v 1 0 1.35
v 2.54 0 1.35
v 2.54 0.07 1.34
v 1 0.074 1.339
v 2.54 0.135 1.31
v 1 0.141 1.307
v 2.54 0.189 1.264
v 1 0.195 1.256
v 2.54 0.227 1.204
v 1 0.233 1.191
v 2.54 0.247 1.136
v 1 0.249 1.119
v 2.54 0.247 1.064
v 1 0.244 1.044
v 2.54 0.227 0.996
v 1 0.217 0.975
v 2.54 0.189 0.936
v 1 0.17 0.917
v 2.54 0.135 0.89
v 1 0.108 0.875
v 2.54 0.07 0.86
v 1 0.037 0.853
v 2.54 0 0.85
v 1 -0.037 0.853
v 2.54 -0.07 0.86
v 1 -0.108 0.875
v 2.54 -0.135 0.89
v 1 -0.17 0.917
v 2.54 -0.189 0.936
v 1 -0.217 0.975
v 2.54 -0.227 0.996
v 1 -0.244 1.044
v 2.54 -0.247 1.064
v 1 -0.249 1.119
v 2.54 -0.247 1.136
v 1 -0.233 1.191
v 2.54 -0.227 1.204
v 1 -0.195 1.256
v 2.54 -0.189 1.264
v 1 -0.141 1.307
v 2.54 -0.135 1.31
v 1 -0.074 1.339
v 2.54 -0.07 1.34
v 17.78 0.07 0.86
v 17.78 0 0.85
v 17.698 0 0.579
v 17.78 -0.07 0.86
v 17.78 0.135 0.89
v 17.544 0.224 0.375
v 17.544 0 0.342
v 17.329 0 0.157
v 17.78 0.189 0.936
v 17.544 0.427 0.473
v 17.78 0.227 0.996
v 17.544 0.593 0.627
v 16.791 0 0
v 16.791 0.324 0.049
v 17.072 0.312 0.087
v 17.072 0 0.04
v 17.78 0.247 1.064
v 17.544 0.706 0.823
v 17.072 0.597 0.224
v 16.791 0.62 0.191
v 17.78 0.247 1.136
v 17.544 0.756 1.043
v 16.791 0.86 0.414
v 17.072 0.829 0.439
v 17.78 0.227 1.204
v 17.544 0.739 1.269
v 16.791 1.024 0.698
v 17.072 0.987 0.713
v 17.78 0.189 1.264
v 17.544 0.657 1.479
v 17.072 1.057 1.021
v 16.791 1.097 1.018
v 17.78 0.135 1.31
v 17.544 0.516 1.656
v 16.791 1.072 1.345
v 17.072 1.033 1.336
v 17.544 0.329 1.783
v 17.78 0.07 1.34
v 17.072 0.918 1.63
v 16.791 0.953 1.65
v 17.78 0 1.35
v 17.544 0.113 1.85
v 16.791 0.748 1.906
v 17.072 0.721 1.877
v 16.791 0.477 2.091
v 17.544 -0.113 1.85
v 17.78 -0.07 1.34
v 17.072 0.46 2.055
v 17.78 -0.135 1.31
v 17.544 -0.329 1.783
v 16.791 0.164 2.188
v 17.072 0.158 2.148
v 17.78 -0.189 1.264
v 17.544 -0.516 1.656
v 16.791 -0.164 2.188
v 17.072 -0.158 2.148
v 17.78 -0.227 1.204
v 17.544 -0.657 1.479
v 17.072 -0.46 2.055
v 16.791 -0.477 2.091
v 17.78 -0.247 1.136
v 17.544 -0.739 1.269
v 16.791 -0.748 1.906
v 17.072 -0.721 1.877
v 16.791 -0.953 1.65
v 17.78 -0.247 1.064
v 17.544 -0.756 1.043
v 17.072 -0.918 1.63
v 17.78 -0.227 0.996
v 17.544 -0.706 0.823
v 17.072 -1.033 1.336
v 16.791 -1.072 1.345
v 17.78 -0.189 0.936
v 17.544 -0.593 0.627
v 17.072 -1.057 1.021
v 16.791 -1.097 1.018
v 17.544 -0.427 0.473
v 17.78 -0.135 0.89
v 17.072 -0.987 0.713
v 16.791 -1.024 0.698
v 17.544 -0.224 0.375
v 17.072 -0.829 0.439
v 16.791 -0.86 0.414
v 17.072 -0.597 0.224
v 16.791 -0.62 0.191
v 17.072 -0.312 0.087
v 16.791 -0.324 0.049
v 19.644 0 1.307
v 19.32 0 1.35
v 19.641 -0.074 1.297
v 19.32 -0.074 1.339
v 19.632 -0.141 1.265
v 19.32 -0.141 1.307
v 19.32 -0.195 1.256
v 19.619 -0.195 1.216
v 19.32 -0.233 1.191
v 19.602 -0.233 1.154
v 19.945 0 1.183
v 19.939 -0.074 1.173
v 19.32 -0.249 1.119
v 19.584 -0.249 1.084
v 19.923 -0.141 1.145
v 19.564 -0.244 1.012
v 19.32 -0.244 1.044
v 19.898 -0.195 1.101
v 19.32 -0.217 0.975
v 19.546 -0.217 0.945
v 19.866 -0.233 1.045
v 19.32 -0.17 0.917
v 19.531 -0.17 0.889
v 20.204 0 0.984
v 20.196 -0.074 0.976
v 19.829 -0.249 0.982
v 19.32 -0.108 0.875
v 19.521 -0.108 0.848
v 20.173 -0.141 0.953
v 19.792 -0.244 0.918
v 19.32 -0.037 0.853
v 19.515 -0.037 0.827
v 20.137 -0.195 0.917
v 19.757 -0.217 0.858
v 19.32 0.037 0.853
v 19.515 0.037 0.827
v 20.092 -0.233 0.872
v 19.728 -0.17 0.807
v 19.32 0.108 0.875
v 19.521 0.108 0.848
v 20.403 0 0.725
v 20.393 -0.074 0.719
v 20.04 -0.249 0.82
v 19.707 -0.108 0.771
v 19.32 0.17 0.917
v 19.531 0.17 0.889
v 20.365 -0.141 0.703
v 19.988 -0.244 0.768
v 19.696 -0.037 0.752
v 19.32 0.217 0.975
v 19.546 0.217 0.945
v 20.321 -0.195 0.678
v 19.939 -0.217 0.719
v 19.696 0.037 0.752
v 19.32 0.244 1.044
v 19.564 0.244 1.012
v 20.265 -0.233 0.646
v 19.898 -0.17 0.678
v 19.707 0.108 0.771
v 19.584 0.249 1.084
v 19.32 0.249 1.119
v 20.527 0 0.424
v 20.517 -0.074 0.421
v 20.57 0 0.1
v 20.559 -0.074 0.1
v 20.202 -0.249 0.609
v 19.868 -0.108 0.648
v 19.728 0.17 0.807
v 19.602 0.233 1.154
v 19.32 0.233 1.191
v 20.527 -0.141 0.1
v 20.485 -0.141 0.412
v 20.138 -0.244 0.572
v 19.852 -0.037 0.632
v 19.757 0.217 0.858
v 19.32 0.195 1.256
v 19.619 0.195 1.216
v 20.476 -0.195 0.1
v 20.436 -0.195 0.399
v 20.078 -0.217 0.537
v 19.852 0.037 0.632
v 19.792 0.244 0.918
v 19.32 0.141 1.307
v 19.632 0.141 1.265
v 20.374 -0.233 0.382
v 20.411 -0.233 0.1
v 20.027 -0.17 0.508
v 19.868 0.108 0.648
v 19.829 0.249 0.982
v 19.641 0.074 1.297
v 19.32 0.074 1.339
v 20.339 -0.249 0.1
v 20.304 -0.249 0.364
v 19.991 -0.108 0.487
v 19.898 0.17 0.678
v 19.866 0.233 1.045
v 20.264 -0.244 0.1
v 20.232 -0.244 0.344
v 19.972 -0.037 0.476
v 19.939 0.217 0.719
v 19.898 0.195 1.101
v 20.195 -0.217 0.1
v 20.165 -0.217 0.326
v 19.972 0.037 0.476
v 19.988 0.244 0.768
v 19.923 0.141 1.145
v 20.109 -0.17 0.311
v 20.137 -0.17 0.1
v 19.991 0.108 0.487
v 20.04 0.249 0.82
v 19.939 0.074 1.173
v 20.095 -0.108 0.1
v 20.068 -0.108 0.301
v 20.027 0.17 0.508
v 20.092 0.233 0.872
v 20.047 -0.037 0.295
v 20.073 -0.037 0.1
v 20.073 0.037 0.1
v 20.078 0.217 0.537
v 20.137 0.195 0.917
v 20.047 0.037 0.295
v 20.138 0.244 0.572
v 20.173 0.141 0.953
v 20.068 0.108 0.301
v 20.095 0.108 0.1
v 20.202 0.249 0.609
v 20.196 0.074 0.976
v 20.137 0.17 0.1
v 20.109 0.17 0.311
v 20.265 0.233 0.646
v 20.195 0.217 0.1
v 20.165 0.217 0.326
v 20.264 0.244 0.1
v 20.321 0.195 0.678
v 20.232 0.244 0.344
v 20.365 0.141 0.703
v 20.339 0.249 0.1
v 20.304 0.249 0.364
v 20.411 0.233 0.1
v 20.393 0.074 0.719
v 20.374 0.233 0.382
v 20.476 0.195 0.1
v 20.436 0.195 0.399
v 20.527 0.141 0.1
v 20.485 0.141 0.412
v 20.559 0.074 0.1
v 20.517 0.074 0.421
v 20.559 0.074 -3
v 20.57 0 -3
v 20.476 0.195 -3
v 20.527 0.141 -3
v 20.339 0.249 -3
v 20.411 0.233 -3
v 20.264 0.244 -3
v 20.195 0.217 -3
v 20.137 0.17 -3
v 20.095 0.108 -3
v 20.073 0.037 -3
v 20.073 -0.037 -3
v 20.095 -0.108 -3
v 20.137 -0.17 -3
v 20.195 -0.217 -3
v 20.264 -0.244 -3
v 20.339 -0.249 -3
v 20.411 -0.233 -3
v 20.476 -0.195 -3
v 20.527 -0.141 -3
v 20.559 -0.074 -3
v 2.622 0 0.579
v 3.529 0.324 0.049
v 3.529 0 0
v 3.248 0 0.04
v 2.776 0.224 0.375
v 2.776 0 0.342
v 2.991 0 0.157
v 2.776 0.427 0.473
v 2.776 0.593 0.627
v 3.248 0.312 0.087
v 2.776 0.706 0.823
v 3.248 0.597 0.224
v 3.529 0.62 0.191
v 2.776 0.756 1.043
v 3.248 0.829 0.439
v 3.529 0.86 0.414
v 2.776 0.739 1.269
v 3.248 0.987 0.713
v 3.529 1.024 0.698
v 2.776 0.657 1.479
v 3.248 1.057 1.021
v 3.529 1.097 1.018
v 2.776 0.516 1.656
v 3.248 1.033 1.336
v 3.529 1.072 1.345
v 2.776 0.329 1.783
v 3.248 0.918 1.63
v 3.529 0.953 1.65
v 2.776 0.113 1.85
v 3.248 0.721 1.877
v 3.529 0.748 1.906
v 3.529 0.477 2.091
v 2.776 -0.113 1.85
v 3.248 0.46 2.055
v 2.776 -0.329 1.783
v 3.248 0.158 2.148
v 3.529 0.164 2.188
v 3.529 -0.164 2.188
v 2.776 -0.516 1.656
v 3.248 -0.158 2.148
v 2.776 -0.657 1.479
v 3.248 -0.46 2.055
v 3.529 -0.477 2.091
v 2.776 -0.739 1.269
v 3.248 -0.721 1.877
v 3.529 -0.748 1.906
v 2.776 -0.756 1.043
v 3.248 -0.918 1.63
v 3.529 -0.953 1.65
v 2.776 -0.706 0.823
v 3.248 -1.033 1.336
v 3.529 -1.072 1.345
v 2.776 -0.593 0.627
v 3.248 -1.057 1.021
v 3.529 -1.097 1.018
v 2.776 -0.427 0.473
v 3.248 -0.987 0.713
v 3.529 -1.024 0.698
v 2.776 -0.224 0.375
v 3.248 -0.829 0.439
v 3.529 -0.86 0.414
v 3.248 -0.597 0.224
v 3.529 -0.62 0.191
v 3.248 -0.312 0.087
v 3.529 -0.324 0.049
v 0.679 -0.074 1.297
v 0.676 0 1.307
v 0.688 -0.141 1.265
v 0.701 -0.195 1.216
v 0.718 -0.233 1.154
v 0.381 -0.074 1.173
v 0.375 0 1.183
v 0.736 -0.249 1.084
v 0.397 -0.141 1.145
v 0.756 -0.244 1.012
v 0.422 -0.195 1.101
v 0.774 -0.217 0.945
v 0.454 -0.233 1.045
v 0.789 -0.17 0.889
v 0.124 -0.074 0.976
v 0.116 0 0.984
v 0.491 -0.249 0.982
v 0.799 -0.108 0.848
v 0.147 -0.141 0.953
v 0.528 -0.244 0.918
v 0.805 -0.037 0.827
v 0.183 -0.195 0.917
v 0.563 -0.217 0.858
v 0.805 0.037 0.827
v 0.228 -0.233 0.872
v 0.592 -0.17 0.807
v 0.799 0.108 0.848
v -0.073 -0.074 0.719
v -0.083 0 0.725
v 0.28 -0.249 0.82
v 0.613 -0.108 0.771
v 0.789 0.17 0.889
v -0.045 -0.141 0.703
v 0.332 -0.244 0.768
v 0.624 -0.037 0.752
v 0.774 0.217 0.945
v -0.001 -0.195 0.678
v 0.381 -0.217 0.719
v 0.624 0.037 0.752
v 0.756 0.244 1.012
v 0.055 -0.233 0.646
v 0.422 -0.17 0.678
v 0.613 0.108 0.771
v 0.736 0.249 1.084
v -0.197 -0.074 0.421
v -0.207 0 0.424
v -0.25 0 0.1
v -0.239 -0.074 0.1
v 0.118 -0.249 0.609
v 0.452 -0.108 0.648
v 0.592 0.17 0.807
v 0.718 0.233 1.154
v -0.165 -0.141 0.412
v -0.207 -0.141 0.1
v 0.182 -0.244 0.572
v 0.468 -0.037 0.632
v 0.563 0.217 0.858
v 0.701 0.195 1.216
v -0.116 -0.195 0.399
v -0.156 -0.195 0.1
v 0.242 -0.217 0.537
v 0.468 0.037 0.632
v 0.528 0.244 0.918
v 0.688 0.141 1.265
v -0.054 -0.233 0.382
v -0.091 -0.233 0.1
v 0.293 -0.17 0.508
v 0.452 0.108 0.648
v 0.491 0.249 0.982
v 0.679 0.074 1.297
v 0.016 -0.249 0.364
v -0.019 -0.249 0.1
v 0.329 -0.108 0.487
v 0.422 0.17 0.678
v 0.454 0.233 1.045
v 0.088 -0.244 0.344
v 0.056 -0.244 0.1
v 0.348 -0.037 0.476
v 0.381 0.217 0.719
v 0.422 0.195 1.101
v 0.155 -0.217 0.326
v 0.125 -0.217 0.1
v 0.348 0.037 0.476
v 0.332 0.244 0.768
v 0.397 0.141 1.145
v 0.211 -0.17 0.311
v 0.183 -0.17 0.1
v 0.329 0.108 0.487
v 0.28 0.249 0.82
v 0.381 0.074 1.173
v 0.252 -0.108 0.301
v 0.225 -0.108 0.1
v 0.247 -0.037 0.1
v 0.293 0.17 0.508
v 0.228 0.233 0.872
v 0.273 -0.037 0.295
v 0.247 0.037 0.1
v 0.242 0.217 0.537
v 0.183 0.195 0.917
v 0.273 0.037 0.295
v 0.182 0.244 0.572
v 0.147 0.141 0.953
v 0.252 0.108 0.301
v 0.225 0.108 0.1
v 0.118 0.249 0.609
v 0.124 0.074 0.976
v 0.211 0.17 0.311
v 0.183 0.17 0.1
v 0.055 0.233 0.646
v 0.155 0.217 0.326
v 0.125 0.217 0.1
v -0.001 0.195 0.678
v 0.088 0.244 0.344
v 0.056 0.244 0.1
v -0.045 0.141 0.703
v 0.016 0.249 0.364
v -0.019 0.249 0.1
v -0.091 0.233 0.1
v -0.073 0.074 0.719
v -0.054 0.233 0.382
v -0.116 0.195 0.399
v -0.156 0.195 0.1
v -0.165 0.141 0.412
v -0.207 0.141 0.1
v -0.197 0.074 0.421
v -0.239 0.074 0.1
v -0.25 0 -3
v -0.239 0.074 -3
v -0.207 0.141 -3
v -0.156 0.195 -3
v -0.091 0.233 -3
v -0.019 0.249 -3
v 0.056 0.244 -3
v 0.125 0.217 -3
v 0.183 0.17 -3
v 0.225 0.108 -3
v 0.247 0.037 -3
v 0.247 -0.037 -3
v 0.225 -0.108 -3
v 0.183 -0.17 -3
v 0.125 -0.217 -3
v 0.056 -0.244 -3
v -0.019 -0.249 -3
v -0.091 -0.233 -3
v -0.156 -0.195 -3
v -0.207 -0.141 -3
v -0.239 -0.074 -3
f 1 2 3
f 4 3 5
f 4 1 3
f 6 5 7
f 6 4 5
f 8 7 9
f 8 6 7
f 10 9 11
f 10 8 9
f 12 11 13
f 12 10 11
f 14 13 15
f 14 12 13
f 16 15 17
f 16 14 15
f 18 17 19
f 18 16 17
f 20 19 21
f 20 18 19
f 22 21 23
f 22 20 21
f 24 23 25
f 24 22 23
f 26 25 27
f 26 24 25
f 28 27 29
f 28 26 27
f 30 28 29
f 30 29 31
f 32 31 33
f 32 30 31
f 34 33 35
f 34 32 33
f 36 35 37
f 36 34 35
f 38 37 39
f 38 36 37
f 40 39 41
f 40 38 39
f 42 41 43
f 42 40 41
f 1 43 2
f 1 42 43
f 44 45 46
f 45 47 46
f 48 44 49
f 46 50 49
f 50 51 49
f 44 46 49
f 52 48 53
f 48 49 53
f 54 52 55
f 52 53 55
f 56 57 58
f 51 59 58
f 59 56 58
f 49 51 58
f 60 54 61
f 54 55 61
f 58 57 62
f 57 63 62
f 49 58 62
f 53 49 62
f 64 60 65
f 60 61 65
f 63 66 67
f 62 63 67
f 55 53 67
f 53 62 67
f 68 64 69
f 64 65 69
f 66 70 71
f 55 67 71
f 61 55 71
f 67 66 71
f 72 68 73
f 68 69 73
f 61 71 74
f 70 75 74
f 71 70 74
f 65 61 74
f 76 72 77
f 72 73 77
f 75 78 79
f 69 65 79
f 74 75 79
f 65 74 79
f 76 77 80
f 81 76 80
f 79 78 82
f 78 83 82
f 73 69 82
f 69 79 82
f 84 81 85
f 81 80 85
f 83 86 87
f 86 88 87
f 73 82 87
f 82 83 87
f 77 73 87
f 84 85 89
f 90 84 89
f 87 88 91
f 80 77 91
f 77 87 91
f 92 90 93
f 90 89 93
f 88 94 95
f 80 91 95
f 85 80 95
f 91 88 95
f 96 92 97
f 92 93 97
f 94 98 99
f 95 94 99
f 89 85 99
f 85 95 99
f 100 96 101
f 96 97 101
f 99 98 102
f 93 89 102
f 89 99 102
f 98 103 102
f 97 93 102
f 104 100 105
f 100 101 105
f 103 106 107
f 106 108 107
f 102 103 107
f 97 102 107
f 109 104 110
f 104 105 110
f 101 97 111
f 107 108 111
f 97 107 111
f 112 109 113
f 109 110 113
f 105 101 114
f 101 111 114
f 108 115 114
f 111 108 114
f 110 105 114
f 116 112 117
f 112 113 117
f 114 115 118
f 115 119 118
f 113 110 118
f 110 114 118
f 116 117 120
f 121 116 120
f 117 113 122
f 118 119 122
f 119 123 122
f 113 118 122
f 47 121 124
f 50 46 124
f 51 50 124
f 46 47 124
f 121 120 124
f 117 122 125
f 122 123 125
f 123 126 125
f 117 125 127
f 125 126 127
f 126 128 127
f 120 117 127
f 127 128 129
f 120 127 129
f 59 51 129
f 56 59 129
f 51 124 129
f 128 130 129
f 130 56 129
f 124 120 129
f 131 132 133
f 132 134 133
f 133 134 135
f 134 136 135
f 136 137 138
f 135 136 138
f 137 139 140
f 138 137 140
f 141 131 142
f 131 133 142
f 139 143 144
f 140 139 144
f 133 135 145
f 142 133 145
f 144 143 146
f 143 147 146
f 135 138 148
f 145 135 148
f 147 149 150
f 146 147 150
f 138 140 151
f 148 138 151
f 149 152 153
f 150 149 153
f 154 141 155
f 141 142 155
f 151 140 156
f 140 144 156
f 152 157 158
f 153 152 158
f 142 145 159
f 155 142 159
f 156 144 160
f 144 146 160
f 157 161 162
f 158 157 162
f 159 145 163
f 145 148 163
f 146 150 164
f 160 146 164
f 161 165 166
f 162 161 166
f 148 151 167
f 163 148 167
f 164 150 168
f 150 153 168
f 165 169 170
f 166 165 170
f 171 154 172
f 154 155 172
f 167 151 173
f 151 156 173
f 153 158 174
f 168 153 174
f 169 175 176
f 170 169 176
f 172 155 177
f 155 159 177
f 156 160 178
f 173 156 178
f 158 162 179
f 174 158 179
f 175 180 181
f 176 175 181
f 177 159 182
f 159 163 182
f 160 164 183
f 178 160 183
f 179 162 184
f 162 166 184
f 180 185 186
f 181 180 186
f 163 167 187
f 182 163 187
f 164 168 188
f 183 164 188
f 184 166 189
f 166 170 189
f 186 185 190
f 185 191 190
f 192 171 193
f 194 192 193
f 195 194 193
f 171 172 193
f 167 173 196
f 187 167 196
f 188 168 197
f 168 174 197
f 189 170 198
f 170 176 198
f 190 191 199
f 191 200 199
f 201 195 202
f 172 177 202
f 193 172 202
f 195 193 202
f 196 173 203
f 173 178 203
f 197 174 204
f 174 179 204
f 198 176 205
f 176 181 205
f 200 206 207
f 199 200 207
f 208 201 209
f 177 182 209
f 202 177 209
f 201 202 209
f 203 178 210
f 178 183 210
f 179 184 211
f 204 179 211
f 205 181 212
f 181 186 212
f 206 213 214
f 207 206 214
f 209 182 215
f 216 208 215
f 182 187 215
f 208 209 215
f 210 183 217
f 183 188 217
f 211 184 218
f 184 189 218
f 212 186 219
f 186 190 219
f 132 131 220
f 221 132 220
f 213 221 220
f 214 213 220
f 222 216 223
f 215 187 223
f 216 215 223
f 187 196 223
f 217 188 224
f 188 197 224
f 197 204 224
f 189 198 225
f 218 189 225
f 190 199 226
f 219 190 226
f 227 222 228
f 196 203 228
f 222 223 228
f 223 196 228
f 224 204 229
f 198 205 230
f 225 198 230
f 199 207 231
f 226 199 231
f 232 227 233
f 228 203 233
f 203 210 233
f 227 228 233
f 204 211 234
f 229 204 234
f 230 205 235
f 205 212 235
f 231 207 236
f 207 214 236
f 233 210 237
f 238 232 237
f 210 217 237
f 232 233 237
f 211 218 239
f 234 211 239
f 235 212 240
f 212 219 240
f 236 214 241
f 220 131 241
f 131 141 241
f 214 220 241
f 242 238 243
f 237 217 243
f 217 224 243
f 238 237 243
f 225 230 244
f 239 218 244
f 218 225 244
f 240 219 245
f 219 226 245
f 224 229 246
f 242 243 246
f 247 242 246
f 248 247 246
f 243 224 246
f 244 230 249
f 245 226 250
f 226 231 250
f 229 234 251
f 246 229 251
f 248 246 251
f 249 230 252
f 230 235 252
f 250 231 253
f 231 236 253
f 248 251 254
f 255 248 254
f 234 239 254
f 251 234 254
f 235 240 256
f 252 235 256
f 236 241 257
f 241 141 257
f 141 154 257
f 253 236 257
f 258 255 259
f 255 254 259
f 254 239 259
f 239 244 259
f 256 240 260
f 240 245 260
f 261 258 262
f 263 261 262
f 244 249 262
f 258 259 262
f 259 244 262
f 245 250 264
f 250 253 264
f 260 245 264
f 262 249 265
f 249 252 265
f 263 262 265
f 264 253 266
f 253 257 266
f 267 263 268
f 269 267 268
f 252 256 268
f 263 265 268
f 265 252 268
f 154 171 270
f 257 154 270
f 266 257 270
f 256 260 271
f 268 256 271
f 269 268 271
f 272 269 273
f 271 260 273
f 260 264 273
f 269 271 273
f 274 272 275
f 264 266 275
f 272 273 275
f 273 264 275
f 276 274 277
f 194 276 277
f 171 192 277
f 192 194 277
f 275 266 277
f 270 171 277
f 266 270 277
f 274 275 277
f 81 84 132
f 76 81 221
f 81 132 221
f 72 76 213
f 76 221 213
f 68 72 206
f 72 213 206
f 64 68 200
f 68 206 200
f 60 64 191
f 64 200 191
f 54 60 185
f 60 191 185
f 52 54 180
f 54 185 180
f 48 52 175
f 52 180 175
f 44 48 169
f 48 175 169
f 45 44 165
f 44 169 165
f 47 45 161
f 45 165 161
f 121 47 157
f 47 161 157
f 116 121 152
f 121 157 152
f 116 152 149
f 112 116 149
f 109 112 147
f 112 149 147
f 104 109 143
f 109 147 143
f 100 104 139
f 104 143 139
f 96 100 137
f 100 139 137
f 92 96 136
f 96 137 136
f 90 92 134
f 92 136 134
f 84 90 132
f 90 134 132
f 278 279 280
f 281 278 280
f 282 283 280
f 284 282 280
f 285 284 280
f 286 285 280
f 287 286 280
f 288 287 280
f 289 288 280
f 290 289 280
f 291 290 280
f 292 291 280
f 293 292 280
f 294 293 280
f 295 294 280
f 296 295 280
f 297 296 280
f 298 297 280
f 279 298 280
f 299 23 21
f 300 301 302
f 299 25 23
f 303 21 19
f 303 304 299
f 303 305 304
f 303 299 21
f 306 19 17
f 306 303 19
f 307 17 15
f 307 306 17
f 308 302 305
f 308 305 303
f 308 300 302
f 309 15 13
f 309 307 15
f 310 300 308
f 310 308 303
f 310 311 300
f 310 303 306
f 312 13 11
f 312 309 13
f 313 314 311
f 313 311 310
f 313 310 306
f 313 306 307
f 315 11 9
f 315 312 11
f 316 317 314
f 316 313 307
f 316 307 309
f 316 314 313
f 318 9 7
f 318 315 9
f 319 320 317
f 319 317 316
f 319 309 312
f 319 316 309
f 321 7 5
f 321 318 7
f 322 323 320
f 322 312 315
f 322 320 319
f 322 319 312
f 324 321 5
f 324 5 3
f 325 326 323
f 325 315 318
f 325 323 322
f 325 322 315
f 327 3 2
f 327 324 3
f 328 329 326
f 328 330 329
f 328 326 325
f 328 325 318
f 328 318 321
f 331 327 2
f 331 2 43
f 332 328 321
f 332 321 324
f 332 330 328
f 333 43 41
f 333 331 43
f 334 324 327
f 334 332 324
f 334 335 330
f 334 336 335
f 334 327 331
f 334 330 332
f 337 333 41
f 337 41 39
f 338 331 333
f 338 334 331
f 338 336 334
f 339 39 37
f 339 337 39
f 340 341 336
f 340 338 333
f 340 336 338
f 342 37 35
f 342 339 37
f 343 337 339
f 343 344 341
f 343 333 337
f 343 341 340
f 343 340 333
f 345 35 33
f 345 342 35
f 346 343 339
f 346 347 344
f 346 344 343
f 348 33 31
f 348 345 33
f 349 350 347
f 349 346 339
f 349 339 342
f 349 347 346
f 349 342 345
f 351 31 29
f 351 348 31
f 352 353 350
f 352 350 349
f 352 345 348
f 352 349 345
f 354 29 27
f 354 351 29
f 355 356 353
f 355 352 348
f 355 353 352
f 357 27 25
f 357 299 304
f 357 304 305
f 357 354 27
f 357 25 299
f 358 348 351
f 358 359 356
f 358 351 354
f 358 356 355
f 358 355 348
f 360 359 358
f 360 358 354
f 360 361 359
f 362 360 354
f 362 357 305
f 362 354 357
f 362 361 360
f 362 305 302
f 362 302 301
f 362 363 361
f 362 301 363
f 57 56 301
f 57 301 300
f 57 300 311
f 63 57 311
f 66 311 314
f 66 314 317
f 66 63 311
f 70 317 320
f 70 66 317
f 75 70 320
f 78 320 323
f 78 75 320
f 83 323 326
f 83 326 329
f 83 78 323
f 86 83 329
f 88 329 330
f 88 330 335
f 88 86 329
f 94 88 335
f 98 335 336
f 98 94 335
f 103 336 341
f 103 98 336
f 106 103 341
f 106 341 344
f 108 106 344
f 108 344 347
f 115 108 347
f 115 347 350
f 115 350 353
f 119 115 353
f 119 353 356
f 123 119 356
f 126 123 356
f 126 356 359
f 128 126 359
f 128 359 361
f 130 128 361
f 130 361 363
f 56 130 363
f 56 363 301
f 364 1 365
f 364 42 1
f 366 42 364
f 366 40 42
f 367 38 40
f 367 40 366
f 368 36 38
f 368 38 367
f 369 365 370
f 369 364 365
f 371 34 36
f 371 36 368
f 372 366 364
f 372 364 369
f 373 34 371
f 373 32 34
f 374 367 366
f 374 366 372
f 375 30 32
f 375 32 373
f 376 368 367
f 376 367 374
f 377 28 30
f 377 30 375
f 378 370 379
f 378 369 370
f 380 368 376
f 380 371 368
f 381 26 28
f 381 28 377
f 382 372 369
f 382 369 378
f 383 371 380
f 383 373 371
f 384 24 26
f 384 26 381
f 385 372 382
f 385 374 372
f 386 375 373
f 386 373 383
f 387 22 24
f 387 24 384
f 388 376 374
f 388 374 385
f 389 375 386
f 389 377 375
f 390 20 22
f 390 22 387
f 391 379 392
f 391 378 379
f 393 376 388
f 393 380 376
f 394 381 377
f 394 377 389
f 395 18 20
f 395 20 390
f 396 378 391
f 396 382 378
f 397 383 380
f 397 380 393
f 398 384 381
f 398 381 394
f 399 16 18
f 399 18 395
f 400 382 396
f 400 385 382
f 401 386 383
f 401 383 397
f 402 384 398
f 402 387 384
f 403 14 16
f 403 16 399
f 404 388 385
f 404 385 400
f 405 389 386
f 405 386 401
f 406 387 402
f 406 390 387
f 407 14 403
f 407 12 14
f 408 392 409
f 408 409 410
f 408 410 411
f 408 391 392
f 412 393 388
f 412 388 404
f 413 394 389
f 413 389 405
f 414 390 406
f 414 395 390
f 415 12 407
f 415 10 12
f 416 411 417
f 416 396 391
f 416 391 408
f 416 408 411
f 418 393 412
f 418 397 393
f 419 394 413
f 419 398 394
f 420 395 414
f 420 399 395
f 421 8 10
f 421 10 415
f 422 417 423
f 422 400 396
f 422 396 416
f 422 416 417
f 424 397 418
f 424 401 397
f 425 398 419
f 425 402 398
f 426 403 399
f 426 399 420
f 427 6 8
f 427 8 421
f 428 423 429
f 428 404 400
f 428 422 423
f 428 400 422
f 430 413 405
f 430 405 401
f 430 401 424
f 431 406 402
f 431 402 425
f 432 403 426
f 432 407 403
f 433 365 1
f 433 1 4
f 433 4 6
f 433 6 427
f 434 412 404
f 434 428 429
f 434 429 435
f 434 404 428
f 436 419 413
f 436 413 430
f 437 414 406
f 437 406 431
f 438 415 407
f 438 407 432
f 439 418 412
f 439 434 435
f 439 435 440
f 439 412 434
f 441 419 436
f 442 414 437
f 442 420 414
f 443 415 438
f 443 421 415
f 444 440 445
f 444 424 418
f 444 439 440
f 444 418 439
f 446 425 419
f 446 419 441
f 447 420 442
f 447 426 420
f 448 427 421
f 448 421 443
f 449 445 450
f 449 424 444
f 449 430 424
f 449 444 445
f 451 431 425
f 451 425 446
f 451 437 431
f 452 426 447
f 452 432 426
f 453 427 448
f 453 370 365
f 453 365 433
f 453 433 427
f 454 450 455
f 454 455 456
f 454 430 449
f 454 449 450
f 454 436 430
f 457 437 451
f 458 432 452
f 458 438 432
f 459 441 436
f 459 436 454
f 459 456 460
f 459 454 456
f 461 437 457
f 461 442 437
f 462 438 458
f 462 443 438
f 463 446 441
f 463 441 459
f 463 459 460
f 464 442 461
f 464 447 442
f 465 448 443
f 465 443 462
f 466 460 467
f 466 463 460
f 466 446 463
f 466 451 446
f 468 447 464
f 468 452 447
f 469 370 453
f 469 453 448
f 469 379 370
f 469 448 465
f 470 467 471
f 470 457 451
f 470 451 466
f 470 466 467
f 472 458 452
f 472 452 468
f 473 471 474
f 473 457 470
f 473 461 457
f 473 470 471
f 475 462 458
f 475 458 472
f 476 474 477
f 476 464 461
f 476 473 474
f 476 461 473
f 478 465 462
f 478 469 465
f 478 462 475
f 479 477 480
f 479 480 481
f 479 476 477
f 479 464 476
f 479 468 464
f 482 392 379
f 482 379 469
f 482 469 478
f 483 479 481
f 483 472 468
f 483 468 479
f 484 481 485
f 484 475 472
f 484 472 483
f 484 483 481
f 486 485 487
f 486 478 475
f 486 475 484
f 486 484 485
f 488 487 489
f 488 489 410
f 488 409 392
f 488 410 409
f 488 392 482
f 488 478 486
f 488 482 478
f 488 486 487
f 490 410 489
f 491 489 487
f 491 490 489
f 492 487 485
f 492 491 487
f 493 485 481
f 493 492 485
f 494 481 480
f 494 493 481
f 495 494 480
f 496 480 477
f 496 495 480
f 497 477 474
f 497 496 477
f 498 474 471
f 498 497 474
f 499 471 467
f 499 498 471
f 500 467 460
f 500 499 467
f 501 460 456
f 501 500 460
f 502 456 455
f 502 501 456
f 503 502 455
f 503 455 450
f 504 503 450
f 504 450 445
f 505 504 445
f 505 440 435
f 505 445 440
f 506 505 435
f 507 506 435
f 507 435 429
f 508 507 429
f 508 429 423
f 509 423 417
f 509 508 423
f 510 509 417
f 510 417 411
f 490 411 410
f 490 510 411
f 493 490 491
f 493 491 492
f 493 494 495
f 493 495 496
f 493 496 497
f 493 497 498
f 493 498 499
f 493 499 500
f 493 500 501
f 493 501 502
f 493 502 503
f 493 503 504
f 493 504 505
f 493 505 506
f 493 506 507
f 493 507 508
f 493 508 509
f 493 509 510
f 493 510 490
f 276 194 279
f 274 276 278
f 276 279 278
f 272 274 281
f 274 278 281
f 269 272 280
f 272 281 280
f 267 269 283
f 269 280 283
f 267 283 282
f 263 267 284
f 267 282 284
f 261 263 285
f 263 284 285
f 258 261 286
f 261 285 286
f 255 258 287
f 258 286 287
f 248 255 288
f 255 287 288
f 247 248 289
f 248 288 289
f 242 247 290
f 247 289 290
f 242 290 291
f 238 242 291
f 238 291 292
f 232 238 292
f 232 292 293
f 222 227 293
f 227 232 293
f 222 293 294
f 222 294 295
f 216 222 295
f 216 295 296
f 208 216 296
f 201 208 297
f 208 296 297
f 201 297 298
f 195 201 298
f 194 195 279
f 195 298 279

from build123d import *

# Parameters (mm, degrees)
EXTRUDE1_START = 2.54
SKETCH1_R      = 1.1
EXTRUDE1_DEPTH = 7.62
SKETCH3_R      = 0.25
FILLET1_R      = 1


with BuildPart() as part:
    # Sketch1 → Extrude1 (new body)
    with BuildSketch(Plane(origin=(0, 0, 0), x_dir=(0, 0, -1), z_dir=(1, 0, 0)).offset(EXTRUDE1_START)):
        with Locations((-1.1, 0)):
            Circle(SKETCH1_R)
    extrude(amount=EXTRUDE1_DEPTH)

    # Sweep1: sweep along a path in Sketch2
    with BuildLine(Plane(origin=(0, 0, 0), x_dir=(1, 0, 0), z_dir=(0, 1, 0))) as sweep1_path:
        Line((2.54, -1.1), (1, -1.1))
        ThreePointArc((1, -1.1), (0.292893219, -0.807106781), (0, -0.1))
        Line((0, -0.1), (0, 3))
    # Sketch3 → Sweep1 (sweep)
    with BuildSketch(Plane.ZY.offset(-2.54)):
        with Locations((1.1, 0)):
            Circle(SKETCH3_R)
    sweep(path=sweep1_path.line)

    # Fillet1
    # the kernel refuses this fillet: 1 mm, written as the material it takes off along each edge
    with BuildSketch(Plane(origin=(2.54, 0, 1.1), x_dir=(0, 0, -1), z_dir=(0, -1, 0))) as fillet1_piece_1:
        with BuildLine():
            CenterArc((0.1, 0.988685997), FILLET1_R, 278.626926559, 81.373073441)
            Line((0.25, 0), (0.253, -0.01977372))
            ThreePointArc((0.253, -0.01977372), (0.675, -0.02), (1.1, -0.02))
            Line((1.1, -0.02), (1.12, 0))
            Line((1.12, 0), (1.12, 0.988685997))
            Line((1.12, 0.988685997), (1.1, 0.988685997))
        make_face()
    revolve(axis=Axis((2.54, 0, 1.1), (1, 0, 0)), mode=Mode.SUBTRACT)

    # Mirror1: part across plane


with BuildPart() as part_1:
    add(part.part)
    add(part.part.mirror(Plane(origin=(10.16, 0, 1.1), x_dir=(0, 0, 1), z_dir=(1, 0, 0))))


solid = part_1.part
